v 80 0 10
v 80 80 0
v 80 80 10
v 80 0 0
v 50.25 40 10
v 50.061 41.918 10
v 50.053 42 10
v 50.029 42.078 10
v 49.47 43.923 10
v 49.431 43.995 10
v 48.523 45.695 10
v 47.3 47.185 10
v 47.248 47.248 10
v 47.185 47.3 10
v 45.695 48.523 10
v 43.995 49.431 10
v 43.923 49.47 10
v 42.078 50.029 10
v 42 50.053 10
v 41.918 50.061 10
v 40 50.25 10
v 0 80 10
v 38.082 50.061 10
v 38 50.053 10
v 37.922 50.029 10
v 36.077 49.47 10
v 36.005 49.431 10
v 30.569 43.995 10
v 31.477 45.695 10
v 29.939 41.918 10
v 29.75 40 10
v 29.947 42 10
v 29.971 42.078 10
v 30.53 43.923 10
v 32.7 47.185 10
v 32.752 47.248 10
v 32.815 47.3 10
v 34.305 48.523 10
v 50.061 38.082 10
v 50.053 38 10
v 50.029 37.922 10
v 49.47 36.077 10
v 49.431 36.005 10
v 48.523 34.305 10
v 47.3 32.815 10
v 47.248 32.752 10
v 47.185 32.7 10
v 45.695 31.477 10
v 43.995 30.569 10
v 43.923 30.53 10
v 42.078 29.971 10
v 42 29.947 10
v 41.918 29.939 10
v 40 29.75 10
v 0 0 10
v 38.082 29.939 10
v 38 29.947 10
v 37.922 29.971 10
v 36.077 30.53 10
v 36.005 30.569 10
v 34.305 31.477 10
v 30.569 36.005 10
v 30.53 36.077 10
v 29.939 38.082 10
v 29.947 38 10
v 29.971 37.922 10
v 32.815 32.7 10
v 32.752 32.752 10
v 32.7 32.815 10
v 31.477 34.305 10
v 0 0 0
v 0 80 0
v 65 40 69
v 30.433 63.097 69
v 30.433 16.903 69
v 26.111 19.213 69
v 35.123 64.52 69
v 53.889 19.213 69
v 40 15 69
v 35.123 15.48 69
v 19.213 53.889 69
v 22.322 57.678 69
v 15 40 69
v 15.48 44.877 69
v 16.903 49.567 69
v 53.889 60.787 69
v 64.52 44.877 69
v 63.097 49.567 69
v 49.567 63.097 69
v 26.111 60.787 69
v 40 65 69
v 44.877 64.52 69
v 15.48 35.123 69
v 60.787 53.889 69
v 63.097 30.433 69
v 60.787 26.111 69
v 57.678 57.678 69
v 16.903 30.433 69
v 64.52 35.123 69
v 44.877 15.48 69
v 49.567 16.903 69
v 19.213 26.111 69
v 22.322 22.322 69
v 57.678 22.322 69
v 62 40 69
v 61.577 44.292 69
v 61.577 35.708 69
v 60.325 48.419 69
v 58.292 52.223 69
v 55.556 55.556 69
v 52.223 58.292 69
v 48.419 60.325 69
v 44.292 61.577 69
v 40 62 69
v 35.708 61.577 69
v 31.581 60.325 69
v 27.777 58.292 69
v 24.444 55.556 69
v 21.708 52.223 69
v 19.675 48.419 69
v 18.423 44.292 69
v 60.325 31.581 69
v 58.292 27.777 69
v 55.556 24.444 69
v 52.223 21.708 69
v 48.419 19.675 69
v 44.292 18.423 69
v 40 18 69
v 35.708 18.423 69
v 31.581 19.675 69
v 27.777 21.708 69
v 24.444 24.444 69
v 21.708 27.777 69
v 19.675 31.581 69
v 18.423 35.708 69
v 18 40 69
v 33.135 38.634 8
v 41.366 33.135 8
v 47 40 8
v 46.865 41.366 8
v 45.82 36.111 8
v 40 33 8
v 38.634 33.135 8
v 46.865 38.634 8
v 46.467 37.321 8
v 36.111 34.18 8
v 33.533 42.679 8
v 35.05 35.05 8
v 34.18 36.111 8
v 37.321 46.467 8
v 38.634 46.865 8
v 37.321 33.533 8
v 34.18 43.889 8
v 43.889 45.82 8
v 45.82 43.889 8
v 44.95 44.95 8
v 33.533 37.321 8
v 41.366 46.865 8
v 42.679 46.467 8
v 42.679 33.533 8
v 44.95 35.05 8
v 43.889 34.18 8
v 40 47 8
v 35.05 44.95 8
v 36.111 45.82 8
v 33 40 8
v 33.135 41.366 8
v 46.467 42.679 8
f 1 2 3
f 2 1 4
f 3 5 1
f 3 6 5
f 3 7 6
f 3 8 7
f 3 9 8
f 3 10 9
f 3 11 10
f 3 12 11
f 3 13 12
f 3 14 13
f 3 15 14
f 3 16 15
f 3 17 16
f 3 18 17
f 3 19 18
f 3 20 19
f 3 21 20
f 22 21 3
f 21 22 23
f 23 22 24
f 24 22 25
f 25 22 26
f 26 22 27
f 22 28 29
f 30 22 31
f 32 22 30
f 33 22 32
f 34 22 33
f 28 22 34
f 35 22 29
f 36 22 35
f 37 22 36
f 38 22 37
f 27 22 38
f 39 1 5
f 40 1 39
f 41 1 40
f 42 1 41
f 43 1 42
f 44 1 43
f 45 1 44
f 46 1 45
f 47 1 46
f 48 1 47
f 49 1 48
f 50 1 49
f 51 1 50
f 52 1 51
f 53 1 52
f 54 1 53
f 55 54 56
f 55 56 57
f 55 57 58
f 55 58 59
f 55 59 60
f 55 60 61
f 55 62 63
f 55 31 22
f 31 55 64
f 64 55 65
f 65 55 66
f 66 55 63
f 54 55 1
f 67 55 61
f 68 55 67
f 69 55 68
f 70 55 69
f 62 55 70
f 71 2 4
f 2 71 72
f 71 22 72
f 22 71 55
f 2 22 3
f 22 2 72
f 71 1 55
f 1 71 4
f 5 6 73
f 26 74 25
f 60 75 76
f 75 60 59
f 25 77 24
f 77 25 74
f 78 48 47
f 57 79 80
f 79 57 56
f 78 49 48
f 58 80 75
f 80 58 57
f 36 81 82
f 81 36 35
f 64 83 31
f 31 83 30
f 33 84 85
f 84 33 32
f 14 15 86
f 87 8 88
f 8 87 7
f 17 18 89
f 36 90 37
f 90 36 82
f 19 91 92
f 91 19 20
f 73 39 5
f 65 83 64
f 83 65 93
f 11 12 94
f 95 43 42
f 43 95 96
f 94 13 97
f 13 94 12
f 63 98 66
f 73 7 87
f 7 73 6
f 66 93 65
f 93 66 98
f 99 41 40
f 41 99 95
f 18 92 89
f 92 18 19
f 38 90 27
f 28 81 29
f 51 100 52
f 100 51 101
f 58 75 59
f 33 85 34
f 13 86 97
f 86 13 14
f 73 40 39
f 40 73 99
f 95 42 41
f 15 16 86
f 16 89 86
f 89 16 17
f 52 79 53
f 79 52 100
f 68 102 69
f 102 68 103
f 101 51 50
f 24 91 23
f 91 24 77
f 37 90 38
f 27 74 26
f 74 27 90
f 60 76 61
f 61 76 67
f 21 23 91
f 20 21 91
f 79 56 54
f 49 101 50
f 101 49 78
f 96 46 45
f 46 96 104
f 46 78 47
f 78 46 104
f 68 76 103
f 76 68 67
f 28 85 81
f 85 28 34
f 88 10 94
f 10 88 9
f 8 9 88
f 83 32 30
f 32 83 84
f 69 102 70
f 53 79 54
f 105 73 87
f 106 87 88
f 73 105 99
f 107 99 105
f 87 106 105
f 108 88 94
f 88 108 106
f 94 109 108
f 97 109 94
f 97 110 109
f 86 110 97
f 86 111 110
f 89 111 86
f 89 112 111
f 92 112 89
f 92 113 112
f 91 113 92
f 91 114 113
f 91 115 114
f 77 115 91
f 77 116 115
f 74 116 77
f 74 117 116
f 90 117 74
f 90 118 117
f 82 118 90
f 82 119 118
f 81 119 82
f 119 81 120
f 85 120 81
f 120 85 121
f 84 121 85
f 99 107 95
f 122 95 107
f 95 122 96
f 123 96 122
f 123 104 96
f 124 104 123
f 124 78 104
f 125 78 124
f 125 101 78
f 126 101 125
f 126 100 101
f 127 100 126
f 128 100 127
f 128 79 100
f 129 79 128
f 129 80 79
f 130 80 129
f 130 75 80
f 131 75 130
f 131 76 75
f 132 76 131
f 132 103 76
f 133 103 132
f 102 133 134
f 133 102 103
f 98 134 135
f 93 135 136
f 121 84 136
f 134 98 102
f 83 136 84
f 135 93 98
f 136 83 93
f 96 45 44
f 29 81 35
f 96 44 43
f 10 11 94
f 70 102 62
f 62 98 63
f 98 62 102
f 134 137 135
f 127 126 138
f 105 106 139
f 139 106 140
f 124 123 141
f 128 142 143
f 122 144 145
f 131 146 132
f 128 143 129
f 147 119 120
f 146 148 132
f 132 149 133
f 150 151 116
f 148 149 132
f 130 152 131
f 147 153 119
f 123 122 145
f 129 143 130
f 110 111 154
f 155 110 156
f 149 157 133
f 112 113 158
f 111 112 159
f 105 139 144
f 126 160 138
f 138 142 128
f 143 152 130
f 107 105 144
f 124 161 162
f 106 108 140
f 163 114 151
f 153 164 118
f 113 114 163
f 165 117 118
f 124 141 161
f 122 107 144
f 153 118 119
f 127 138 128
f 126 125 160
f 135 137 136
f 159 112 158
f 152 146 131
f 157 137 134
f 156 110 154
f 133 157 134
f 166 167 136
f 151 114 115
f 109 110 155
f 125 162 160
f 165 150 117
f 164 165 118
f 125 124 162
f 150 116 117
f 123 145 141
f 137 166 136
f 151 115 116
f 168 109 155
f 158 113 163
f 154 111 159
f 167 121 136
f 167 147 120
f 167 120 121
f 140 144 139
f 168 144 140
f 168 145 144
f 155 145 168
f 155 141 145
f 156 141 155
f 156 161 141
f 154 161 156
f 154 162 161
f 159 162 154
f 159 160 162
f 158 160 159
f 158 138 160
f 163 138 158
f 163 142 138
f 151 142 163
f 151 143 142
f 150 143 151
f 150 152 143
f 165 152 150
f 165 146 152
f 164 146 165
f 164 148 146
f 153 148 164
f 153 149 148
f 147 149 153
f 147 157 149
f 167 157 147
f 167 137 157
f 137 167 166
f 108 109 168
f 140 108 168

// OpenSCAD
$fn = 32;

// ----------------------------------------------------------------------
// Hopper: funnel with square flange
// ----------------------------------------------------------------------

// --- parameters (mm) ---
fl = 80;                  // flange side, X and Y
fl_t = 10;                // flange thickness
cone_h = 60;              // cone height above the flange
top_d = 50;               // cone mouth diameter
bot_d = 20;               // cone spout diameter
wall = 3;                 // cone wall thickness

bore_d = bot_d - 2 * wall;  // spout bore diameter
total_h = fl_t + cone_h - 1;  // overall height

difference() {
  union() {
    cube([fl, fl, fl_t]);
    translate([fl / 2, fl / 2, fl_t - 1])
      cylinder(h = cone_h, d1 = bot_d, d2 = top_d);
  }
  translate([fl / 2, fl / 2, fl_t - 2])
    cylinder(h = cone_h + 1, d1 = bore_d, d2 = top_d - 2 * wall);
}
